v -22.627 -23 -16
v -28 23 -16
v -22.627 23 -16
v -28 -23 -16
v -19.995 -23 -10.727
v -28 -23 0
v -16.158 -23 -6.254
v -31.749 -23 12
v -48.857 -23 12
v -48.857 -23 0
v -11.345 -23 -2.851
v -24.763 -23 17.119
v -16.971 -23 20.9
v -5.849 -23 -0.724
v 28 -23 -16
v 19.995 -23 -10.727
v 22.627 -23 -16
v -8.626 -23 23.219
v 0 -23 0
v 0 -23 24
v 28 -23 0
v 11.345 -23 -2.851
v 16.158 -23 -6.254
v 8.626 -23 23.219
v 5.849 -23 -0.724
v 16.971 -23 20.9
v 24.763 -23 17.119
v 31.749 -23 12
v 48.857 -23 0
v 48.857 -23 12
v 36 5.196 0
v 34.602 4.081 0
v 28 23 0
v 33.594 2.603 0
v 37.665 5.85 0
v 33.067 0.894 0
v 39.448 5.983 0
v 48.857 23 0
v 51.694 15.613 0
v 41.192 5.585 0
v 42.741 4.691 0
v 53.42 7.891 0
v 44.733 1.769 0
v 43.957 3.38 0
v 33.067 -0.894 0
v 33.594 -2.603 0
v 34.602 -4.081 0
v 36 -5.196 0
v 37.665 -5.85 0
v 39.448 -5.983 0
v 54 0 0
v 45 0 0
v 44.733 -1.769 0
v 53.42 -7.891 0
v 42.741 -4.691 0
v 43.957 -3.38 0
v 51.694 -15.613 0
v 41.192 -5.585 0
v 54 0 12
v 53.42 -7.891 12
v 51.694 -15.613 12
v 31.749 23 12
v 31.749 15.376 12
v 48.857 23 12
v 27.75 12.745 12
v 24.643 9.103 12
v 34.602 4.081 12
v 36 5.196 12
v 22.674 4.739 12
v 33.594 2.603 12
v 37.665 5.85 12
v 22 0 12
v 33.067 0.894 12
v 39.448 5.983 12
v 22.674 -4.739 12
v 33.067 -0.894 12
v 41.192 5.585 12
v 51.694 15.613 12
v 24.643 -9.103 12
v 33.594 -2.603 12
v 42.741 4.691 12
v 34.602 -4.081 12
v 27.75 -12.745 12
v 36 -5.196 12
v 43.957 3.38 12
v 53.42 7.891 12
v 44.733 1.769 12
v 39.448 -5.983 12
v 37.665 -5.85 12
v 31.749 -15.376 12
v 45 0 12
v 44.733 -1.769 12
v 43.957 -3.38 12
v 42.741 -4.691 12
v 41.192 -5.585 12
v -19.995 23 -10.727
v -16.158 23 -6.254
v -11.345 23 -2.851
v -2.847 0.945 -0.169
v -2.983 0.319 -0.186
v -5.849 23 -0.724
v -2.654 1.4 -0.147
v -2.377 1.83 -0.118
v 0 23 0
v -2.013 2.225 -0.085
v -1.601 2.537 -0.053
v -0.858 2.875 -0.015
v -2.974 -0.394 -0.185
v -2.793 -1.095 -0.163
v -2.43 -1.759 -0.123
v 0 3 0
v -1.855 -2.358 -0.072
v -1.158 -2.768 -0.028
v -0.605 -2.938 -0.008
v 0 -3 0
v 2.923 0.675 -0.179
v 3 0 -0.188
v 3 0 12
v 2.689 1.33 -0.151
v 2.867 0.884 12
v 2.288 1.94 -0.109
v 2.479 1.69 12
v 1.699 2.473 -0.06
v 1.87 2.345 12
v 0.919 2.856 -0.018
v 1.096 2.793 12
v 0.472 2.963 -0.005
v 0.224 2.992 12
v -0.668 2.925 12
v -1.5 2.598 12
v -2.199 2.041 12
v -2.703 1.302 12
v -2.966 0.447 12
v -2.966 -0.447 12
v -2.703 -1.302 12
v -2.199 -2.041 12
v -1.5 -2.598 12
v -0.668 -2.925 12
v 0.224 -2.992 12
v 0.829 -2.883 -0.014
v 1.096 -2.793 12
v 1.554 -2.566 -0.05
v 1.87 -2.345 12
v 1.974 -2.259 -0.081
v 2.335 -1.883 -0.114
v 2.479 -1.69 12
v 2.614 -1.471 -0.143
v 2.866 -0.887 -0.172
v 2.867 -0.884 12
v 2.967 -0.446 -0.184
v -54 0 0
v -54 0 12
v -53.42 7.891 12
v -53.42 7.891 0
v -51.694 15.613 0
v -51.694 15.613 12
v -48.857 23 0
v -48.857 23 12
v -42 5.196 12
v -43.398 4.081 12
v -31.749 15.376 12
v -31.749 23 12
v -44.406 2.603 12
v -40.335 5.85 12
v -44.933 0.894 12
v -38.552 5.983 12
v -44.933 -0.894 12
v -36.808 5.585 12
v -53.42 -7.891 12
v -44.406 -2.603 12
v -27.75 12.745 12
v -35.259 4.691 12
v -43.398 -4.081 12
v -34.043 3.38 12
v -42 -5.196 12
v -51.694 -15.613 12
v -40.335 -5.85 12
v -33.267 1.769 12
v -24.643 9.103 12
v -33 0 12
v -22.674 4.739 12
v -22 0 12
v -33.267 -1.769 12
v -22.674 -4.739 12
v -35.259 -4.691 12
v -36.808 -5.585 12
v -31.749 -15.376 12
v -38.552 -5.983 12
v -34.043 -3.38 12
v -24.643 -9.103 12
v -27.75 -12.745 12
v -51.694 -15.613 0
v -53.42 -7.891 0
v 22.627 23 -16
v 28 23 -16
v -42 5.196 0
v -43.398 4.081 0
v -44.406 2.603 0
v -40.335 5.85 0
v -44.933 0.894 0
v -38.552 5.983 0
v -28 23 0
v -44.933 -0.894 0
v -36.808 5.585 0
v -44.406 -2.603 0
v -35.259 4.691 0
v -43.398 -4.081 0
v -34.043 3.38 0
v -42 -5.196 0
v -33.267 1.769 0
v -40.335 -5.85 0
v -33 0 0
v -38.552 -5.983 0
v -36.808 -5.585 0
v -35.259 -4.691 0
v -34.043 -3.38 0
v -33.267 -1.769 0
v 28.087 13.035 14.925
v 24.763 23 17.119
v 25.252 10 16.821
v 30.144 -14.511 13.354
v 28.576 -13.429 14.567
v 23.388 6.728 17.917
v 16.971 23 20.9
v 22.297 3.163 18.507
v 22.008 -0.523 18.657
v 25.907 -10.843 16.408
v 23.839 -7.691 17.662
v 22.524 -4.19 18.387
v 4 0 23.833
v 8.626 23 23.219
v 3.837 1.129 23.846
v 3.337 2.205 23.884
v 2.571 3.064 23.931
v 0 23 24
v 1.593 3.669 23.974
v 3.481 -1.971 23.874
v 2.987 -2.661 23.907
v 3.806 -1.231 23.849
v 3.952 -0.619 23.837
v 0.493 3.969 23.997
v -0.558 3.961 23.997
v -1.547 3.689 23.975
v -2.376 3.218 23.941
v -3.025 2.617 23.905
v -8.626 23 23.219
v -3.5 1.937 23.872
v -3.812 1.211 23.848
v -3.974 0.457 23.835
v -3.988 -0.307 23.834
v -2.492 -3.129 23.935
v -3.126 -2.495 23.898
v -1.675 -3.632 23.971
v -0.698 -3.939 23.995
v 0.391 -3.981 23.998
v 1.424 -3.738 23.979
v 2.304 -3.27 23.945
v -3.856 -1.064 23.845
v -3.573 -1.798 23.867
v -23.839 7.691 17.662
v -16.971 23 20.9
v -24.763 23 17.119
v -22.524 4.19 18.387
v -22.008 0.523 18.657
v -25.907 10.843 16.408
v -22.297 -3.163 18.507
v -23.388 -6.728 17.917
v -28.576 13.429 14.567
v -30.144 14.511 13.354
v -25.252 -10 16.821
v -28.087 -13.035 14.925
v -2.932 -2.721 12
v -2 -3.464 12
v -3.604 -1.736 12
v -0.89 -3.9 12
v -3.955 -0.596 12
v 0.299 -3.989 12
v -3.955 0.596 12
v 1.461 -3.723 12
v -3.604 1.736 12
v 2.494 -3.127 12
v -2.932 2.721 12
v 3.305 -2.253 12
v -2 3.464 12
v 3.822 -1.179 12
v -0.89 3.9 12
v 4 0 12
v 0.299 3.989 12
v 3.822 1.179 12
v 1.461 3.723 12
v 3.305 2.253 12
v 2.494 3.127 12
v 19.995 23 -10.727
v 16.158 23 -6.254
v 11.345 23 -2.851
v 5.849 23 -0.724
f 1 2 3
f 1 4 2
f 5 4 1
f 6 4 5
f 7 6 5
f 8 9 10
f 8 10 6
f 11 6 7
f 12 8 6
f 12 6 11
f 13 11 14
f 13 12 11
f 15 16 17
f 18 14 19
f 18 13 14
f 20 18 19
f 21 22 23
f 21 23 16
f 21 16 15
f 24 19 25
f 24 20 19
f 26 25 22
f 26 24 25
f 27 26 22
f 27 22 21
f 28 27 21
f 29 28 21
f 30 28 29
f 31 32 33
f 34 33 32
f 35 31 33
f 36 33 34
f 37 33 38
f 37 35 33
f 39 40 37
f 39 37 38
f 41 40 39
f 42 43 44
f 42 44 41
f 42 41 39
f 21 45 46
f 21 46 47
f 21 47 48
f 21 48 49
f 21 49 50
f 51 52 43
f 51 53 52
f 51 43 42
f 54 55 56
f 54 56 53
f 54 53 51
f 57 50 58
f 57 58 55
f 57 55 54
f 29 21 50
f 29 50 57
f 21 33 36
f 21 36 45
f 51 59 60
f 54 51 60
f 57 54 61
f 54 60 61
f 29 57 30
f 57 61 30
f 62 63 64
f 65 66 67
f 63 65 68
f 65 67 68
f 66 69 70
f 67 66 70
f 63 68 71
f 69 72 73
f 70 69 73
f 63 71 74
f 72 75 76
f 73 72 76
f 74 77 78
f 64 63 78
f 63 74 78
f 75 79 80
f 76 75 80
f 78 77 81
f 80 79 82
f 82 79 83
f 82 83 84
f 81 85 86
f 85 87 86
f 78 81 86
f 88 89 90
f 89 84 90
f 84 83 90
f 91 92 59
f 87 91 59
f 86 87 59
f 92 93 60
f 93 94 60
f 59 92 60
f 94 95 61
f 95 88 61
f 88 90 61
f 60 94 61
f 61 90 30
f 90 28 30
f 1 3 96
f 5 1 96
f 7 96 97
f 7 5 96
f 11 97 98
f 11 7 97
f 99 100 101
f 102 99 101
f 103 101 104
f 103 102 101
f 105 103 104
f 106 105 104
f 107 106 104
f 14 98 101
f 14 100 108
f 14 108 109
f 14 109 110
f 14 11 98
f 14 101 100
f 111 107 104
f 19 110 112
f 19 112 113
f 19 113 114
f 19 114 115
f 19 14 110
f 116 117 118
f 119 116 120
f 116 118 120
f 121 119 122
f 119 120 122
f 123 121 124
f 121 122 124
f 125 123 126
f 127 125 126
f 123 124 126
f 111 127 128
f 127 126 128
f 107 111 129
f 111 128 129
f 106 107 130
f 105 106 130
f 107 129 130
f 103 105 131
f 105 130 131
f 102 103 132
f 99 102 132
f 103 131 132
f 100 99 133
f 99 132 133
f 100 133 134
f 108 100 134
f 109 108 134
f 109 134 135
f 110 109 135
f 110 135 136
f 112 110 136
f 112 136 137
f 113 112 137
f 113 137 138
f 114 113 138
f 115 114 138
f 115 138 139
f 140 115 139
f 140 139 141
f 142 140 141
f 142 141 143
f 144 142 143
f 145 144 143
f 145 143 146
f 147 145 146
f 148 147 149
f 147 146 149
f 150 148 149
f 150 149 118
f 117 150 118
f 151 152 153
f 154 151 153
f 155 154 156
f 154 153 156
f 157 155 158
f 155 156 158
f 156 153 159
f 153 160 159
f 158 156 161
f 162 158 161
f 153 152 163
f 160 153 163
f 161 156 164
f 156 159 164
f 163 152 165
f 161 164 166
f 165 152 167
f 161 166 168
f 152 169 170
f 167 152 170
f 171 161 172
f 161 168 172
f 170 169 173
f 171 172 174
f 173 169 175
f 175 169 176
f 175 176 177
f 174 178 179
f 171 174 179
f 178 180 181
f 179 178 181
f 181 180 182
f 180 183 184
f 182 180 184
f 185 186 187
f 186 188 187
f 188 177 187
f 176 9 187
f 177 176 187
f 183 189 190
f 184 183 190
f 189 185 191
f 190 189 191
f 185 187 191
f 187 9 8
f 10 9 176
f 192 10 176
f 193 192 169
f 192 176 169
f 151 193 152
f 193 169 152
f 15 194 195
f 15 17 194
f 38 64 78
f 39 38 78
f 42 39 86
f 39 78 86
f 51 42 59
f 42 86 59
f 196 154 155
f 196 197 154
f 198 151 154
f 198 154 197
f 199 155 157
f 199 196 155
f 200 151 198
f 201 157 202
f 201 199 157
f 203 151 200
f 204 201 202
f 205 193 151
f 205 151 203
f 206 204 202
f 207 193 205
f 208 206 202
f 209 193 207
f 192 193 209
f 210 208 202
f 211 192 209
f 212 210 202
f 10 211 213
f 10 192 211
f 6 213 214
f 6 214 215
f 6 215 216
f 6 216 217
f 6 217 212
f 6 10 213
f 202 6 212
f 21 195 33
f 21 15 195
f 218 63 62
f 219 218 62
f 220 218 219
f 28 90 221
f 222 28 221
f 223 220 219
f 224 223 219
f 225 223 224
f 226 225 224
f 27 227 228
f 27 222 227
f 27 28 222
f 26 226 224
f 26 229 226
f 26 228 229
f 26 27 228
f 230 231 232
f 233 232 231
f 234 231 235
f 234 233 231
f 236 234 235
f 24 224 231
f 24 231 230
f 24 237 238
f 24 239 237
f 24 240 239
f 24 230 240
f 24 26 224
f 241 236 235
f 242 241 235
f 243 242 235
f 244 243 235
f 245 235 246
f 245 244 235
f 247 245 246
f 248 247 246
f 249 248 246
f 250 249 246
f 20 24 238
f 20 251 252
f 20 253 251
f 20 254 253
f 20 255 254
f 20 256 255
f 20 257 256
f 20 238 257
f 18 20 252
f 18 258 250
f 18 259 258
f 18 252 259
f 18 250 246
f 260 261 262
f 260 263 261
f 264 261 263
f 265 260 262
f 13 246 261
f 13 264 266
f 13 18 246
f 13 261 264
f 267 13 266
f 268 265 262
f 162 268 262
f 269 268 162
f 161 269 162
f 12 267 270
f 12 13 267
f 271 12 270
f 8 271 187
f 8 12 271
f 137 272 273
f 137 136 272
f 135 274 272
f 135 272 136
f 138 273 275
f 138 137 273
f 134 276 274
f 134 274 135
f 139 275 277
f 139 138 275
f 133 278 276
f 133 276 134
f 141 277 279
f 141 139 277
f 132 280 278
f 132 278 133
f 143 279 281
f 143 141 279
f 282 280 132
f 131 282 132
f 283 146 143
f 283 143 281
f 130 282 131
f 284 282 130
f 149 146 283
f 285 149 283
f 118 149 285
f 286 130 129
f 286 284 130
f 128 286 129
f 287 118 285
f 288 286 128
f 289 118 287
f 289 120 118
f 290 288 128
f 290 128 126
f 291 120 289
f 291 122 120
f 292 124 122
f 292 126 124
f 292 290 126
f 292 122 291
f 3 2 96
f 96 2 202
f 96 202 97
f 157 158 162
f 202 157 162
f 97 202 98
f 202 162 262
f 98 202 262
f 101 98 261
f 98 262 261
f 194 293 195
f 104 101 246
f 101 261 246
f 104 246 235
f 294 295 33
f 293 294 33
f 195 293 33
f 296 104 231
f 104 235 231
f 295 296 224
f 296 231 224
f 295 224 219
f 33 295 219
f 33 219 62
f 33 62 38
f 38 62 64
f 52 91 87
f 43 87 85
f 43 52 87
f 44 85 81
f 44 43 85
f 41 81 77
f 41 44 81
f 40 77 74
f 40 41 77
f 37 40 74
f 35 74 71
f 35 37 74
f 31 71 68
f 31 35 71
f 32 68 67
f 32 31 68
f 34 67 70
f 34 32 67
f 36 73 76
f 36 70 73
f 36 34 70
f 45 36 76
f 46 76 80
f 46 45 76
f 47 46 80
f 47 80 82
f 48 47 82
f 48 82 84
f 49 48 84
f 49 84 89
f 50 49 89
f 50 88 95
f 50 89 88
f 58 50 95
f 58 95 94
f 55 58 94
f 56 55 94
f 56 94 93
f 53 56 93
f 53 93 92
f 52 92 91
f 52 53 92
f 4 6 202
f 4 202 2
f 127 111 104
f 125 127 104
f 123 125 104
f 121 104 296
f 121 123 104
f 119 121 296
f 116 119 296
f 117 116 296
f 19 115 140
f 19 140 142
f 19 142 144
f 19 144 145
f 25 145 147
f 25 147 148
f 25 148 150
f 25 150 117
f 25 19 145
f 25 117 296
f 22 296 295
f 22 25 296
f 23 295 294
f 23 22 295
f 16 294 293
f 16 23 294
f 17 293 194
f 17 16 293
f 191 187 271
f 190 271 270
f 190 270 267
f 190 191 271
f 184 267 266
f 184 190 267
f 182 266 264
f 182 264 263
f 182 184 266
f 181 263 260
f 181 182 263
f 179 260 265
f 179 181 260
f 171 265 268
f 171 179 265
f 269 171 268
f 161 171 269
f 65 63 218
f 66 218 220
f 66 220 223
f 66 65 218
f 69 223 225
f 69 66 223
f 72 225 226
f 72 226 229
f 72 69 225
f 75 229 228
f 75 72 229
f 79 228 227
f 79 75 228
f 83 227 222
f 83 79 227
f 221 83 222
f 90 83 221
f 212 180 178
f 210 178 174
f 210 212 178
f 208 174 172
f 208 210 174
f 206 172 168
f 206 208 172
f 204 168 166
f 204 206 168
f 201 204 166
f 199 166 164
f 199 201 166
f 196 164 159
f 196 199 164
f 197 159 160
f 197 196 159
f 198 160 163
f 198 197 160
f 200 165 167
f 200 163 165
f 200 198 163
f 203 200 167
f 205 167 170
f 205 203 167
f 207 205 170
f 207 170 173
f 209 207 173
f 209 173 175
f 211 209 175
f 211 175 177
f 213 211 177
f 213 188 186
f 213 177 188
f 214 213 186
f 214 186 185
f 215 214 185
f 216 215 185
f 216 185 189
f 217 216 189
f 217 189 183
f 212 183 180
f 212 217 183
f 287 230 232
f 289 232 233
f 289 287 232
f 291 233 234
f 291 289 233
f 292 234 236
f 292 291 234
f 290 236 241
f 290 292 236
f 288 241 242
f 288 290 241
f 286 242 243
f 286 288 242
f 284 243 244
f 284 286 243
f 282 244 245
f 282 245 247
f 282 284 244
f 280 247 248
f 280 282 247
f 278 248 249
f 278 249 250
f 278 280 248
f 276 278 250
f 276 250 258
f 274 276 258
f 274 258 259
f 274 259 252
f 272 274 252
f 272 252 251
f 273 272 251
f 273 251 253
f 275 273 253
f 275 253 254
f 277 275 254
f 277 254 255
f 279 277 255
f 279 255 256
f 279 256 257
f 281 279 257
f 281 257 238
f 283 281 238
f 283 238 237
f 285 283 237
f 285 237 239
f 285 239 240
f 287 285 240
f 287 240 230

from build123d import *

# Parameters (mm, degrees)
F0_W           = 108
F0_H           = 12
F1_DEPTH       = 23
F3_DEPTH       = 23
F5_DEPTH       = 23
F6_R           = 6
F7_DEPTH       = 16.001
F7_DEPTH_BACK  = 25
F9_DEPTH       = 25
F10_R          = 4
F11_DEPTH      = 16
F12_R          = 3
F13_DEPTH      = 25
F13_DEPTH_BACK = 25
F15_DEPTH      = 25


with BuildPart() as f1:
    # F0 (on Front) → F1 (new body, symmetric)
    with BuildSketch(Plane.XZ):
        with Locations((0, 6)):
            Rectangle(F0_W, F0_H)
    extrude(amount=F1_DEPTH, both=True)

    # F2 (on Front) → F3 (join, symmetric)
    with BuildSketch(Plane.XZ):
        with BuildLine():
            ThreePointArc((-22.627416998, -16), (-13.8564064606, -4.4040820577), (0, 0))
            Line((0, 0), (-28, 0))
            Line((-28, 0), (-28, -16))
            Line((-28, -16), (-22.627416998, -16))
        make_face()
        with BuildLine():
            Line((28, -16), (28, 0))
            Line((28, 0), (0, 0))
            ThreePointArc((0, 0), (13.8564064606, -4.4040820577), (22.627416998, -16))
            Line((22.627416998, -16), (28, -16))
        make_face()
    extrude(amount=F3_DEPTH, both=True)

    # F4 (on Front) → F5 (join, symmetric)
    with BuildSketch(Plane.XZ):
        with BuildLine():
            ThreePointArc((31.7490157328, 12), (0, 24), (-31.7490157328, 12))
            Line((-31.7490157328, 12), (31.7490157328, 12))
        make_face()
    extrude(amount=F5_DEPTH, both=True)

    # F6 (on Top) → F7 (cut, two sides)
    with BuildSketch(Plane.XY) as f7_sk:
        with Locations((-39, 0)):
            Circle(F6_R)
        with Locations((39, 0)):
            Circle(F6_R)
    extrude(amount=-F7_DEPTH, mode=Mode.SUBTRACT)
    extrude(f7_sk.sketch, amount=F7_DEPTH_BACK, mode=Mode.SUBTRACT)

    # F8 (on face) → F9 (cut)
    with BuildSketch(Plane.XY.offset(12)):
        with BuildLine():
            ThreePointArc((31.7490157328, 15.3760601962), (22, 0), (31.7490157328, -15.3760601962))
            Line((31.7490157328, -15.3760601962), (31.7490157328, 15.3760601962))
        make_face()
        with BuildLine():
            Line((-31.7490157328, 15.3760601962), (-31.7490157328, -15.3760601962))
            ThreePointArc((-31.7490157328, -15.3760601962), (-22, 0), (-31.7490157328, 15.3760601962))
        make_face()
    extrude(amount=F9_DEPTH, mode=Mode.SUBTRACT)

    # F10 (on face) → F11 (cut)
    with BuildSketch(Plane.XY.offset(12)):
        Circle(F10_R)
    extrude(amount=F11_DEPTH, mode=Mode.SUBTRACT)

    # F12 (on face) → F13 (cut, two sides)
    with BuildSketch(Plane.XY.offset(12)) as f13_sk:
        Circle(F12_R)
    extrude(amount=-F13_DEPTH, mode=Mode.SUBTRACT)
    extrude(f13_sk.sketch, amount=F13_DEPTH_BACK, mode=Mode.SUBTRACT)

    # F14 (on face) → F15 (cut)
    with BuildSketch(Plane.XY.offset(12)):
        with BuildLine():
            ThreePointArc((-48.8569340012, -23), (-52.6985504358, -11.7840053448), (-54, 0))
            Line((-54, 0), (-54, -23))
            Line((-54, -23), (-48.8569340012, -23))
        make_face()
        with BuildLine():
            ThreePointArc((-54, 0), (-52.6985504358, 11.7840053448), (-48.8569340012, 23))
            Line((-48.8569340012, 23), (-54, 23))
            Line((-54, 23), (-54, 0))
        make_face()
        with BuildLine():
            ThreePointArc((54, 1.623e-07), (52.6985504535, -11.7840052656), (48.8569340012, -23))
            Line((48.8569340012, -23), (54, -23))
            Line((54, -23), (54, 1.623e-07))
        make_face()
        with BuildLine():
            ThreePointArc((48.8569340012, 23), (52.6985504181, 11.784005424), (54, 1.623e-07))
            Line((54, 1.623e-07), (54, 23))
            Line((54, 23), (48.8569340012, 23))
        make_face()
    extrude(amount=-F15_DEPTH, mode=Mode.SUBTRACT)


solid = f1.part
